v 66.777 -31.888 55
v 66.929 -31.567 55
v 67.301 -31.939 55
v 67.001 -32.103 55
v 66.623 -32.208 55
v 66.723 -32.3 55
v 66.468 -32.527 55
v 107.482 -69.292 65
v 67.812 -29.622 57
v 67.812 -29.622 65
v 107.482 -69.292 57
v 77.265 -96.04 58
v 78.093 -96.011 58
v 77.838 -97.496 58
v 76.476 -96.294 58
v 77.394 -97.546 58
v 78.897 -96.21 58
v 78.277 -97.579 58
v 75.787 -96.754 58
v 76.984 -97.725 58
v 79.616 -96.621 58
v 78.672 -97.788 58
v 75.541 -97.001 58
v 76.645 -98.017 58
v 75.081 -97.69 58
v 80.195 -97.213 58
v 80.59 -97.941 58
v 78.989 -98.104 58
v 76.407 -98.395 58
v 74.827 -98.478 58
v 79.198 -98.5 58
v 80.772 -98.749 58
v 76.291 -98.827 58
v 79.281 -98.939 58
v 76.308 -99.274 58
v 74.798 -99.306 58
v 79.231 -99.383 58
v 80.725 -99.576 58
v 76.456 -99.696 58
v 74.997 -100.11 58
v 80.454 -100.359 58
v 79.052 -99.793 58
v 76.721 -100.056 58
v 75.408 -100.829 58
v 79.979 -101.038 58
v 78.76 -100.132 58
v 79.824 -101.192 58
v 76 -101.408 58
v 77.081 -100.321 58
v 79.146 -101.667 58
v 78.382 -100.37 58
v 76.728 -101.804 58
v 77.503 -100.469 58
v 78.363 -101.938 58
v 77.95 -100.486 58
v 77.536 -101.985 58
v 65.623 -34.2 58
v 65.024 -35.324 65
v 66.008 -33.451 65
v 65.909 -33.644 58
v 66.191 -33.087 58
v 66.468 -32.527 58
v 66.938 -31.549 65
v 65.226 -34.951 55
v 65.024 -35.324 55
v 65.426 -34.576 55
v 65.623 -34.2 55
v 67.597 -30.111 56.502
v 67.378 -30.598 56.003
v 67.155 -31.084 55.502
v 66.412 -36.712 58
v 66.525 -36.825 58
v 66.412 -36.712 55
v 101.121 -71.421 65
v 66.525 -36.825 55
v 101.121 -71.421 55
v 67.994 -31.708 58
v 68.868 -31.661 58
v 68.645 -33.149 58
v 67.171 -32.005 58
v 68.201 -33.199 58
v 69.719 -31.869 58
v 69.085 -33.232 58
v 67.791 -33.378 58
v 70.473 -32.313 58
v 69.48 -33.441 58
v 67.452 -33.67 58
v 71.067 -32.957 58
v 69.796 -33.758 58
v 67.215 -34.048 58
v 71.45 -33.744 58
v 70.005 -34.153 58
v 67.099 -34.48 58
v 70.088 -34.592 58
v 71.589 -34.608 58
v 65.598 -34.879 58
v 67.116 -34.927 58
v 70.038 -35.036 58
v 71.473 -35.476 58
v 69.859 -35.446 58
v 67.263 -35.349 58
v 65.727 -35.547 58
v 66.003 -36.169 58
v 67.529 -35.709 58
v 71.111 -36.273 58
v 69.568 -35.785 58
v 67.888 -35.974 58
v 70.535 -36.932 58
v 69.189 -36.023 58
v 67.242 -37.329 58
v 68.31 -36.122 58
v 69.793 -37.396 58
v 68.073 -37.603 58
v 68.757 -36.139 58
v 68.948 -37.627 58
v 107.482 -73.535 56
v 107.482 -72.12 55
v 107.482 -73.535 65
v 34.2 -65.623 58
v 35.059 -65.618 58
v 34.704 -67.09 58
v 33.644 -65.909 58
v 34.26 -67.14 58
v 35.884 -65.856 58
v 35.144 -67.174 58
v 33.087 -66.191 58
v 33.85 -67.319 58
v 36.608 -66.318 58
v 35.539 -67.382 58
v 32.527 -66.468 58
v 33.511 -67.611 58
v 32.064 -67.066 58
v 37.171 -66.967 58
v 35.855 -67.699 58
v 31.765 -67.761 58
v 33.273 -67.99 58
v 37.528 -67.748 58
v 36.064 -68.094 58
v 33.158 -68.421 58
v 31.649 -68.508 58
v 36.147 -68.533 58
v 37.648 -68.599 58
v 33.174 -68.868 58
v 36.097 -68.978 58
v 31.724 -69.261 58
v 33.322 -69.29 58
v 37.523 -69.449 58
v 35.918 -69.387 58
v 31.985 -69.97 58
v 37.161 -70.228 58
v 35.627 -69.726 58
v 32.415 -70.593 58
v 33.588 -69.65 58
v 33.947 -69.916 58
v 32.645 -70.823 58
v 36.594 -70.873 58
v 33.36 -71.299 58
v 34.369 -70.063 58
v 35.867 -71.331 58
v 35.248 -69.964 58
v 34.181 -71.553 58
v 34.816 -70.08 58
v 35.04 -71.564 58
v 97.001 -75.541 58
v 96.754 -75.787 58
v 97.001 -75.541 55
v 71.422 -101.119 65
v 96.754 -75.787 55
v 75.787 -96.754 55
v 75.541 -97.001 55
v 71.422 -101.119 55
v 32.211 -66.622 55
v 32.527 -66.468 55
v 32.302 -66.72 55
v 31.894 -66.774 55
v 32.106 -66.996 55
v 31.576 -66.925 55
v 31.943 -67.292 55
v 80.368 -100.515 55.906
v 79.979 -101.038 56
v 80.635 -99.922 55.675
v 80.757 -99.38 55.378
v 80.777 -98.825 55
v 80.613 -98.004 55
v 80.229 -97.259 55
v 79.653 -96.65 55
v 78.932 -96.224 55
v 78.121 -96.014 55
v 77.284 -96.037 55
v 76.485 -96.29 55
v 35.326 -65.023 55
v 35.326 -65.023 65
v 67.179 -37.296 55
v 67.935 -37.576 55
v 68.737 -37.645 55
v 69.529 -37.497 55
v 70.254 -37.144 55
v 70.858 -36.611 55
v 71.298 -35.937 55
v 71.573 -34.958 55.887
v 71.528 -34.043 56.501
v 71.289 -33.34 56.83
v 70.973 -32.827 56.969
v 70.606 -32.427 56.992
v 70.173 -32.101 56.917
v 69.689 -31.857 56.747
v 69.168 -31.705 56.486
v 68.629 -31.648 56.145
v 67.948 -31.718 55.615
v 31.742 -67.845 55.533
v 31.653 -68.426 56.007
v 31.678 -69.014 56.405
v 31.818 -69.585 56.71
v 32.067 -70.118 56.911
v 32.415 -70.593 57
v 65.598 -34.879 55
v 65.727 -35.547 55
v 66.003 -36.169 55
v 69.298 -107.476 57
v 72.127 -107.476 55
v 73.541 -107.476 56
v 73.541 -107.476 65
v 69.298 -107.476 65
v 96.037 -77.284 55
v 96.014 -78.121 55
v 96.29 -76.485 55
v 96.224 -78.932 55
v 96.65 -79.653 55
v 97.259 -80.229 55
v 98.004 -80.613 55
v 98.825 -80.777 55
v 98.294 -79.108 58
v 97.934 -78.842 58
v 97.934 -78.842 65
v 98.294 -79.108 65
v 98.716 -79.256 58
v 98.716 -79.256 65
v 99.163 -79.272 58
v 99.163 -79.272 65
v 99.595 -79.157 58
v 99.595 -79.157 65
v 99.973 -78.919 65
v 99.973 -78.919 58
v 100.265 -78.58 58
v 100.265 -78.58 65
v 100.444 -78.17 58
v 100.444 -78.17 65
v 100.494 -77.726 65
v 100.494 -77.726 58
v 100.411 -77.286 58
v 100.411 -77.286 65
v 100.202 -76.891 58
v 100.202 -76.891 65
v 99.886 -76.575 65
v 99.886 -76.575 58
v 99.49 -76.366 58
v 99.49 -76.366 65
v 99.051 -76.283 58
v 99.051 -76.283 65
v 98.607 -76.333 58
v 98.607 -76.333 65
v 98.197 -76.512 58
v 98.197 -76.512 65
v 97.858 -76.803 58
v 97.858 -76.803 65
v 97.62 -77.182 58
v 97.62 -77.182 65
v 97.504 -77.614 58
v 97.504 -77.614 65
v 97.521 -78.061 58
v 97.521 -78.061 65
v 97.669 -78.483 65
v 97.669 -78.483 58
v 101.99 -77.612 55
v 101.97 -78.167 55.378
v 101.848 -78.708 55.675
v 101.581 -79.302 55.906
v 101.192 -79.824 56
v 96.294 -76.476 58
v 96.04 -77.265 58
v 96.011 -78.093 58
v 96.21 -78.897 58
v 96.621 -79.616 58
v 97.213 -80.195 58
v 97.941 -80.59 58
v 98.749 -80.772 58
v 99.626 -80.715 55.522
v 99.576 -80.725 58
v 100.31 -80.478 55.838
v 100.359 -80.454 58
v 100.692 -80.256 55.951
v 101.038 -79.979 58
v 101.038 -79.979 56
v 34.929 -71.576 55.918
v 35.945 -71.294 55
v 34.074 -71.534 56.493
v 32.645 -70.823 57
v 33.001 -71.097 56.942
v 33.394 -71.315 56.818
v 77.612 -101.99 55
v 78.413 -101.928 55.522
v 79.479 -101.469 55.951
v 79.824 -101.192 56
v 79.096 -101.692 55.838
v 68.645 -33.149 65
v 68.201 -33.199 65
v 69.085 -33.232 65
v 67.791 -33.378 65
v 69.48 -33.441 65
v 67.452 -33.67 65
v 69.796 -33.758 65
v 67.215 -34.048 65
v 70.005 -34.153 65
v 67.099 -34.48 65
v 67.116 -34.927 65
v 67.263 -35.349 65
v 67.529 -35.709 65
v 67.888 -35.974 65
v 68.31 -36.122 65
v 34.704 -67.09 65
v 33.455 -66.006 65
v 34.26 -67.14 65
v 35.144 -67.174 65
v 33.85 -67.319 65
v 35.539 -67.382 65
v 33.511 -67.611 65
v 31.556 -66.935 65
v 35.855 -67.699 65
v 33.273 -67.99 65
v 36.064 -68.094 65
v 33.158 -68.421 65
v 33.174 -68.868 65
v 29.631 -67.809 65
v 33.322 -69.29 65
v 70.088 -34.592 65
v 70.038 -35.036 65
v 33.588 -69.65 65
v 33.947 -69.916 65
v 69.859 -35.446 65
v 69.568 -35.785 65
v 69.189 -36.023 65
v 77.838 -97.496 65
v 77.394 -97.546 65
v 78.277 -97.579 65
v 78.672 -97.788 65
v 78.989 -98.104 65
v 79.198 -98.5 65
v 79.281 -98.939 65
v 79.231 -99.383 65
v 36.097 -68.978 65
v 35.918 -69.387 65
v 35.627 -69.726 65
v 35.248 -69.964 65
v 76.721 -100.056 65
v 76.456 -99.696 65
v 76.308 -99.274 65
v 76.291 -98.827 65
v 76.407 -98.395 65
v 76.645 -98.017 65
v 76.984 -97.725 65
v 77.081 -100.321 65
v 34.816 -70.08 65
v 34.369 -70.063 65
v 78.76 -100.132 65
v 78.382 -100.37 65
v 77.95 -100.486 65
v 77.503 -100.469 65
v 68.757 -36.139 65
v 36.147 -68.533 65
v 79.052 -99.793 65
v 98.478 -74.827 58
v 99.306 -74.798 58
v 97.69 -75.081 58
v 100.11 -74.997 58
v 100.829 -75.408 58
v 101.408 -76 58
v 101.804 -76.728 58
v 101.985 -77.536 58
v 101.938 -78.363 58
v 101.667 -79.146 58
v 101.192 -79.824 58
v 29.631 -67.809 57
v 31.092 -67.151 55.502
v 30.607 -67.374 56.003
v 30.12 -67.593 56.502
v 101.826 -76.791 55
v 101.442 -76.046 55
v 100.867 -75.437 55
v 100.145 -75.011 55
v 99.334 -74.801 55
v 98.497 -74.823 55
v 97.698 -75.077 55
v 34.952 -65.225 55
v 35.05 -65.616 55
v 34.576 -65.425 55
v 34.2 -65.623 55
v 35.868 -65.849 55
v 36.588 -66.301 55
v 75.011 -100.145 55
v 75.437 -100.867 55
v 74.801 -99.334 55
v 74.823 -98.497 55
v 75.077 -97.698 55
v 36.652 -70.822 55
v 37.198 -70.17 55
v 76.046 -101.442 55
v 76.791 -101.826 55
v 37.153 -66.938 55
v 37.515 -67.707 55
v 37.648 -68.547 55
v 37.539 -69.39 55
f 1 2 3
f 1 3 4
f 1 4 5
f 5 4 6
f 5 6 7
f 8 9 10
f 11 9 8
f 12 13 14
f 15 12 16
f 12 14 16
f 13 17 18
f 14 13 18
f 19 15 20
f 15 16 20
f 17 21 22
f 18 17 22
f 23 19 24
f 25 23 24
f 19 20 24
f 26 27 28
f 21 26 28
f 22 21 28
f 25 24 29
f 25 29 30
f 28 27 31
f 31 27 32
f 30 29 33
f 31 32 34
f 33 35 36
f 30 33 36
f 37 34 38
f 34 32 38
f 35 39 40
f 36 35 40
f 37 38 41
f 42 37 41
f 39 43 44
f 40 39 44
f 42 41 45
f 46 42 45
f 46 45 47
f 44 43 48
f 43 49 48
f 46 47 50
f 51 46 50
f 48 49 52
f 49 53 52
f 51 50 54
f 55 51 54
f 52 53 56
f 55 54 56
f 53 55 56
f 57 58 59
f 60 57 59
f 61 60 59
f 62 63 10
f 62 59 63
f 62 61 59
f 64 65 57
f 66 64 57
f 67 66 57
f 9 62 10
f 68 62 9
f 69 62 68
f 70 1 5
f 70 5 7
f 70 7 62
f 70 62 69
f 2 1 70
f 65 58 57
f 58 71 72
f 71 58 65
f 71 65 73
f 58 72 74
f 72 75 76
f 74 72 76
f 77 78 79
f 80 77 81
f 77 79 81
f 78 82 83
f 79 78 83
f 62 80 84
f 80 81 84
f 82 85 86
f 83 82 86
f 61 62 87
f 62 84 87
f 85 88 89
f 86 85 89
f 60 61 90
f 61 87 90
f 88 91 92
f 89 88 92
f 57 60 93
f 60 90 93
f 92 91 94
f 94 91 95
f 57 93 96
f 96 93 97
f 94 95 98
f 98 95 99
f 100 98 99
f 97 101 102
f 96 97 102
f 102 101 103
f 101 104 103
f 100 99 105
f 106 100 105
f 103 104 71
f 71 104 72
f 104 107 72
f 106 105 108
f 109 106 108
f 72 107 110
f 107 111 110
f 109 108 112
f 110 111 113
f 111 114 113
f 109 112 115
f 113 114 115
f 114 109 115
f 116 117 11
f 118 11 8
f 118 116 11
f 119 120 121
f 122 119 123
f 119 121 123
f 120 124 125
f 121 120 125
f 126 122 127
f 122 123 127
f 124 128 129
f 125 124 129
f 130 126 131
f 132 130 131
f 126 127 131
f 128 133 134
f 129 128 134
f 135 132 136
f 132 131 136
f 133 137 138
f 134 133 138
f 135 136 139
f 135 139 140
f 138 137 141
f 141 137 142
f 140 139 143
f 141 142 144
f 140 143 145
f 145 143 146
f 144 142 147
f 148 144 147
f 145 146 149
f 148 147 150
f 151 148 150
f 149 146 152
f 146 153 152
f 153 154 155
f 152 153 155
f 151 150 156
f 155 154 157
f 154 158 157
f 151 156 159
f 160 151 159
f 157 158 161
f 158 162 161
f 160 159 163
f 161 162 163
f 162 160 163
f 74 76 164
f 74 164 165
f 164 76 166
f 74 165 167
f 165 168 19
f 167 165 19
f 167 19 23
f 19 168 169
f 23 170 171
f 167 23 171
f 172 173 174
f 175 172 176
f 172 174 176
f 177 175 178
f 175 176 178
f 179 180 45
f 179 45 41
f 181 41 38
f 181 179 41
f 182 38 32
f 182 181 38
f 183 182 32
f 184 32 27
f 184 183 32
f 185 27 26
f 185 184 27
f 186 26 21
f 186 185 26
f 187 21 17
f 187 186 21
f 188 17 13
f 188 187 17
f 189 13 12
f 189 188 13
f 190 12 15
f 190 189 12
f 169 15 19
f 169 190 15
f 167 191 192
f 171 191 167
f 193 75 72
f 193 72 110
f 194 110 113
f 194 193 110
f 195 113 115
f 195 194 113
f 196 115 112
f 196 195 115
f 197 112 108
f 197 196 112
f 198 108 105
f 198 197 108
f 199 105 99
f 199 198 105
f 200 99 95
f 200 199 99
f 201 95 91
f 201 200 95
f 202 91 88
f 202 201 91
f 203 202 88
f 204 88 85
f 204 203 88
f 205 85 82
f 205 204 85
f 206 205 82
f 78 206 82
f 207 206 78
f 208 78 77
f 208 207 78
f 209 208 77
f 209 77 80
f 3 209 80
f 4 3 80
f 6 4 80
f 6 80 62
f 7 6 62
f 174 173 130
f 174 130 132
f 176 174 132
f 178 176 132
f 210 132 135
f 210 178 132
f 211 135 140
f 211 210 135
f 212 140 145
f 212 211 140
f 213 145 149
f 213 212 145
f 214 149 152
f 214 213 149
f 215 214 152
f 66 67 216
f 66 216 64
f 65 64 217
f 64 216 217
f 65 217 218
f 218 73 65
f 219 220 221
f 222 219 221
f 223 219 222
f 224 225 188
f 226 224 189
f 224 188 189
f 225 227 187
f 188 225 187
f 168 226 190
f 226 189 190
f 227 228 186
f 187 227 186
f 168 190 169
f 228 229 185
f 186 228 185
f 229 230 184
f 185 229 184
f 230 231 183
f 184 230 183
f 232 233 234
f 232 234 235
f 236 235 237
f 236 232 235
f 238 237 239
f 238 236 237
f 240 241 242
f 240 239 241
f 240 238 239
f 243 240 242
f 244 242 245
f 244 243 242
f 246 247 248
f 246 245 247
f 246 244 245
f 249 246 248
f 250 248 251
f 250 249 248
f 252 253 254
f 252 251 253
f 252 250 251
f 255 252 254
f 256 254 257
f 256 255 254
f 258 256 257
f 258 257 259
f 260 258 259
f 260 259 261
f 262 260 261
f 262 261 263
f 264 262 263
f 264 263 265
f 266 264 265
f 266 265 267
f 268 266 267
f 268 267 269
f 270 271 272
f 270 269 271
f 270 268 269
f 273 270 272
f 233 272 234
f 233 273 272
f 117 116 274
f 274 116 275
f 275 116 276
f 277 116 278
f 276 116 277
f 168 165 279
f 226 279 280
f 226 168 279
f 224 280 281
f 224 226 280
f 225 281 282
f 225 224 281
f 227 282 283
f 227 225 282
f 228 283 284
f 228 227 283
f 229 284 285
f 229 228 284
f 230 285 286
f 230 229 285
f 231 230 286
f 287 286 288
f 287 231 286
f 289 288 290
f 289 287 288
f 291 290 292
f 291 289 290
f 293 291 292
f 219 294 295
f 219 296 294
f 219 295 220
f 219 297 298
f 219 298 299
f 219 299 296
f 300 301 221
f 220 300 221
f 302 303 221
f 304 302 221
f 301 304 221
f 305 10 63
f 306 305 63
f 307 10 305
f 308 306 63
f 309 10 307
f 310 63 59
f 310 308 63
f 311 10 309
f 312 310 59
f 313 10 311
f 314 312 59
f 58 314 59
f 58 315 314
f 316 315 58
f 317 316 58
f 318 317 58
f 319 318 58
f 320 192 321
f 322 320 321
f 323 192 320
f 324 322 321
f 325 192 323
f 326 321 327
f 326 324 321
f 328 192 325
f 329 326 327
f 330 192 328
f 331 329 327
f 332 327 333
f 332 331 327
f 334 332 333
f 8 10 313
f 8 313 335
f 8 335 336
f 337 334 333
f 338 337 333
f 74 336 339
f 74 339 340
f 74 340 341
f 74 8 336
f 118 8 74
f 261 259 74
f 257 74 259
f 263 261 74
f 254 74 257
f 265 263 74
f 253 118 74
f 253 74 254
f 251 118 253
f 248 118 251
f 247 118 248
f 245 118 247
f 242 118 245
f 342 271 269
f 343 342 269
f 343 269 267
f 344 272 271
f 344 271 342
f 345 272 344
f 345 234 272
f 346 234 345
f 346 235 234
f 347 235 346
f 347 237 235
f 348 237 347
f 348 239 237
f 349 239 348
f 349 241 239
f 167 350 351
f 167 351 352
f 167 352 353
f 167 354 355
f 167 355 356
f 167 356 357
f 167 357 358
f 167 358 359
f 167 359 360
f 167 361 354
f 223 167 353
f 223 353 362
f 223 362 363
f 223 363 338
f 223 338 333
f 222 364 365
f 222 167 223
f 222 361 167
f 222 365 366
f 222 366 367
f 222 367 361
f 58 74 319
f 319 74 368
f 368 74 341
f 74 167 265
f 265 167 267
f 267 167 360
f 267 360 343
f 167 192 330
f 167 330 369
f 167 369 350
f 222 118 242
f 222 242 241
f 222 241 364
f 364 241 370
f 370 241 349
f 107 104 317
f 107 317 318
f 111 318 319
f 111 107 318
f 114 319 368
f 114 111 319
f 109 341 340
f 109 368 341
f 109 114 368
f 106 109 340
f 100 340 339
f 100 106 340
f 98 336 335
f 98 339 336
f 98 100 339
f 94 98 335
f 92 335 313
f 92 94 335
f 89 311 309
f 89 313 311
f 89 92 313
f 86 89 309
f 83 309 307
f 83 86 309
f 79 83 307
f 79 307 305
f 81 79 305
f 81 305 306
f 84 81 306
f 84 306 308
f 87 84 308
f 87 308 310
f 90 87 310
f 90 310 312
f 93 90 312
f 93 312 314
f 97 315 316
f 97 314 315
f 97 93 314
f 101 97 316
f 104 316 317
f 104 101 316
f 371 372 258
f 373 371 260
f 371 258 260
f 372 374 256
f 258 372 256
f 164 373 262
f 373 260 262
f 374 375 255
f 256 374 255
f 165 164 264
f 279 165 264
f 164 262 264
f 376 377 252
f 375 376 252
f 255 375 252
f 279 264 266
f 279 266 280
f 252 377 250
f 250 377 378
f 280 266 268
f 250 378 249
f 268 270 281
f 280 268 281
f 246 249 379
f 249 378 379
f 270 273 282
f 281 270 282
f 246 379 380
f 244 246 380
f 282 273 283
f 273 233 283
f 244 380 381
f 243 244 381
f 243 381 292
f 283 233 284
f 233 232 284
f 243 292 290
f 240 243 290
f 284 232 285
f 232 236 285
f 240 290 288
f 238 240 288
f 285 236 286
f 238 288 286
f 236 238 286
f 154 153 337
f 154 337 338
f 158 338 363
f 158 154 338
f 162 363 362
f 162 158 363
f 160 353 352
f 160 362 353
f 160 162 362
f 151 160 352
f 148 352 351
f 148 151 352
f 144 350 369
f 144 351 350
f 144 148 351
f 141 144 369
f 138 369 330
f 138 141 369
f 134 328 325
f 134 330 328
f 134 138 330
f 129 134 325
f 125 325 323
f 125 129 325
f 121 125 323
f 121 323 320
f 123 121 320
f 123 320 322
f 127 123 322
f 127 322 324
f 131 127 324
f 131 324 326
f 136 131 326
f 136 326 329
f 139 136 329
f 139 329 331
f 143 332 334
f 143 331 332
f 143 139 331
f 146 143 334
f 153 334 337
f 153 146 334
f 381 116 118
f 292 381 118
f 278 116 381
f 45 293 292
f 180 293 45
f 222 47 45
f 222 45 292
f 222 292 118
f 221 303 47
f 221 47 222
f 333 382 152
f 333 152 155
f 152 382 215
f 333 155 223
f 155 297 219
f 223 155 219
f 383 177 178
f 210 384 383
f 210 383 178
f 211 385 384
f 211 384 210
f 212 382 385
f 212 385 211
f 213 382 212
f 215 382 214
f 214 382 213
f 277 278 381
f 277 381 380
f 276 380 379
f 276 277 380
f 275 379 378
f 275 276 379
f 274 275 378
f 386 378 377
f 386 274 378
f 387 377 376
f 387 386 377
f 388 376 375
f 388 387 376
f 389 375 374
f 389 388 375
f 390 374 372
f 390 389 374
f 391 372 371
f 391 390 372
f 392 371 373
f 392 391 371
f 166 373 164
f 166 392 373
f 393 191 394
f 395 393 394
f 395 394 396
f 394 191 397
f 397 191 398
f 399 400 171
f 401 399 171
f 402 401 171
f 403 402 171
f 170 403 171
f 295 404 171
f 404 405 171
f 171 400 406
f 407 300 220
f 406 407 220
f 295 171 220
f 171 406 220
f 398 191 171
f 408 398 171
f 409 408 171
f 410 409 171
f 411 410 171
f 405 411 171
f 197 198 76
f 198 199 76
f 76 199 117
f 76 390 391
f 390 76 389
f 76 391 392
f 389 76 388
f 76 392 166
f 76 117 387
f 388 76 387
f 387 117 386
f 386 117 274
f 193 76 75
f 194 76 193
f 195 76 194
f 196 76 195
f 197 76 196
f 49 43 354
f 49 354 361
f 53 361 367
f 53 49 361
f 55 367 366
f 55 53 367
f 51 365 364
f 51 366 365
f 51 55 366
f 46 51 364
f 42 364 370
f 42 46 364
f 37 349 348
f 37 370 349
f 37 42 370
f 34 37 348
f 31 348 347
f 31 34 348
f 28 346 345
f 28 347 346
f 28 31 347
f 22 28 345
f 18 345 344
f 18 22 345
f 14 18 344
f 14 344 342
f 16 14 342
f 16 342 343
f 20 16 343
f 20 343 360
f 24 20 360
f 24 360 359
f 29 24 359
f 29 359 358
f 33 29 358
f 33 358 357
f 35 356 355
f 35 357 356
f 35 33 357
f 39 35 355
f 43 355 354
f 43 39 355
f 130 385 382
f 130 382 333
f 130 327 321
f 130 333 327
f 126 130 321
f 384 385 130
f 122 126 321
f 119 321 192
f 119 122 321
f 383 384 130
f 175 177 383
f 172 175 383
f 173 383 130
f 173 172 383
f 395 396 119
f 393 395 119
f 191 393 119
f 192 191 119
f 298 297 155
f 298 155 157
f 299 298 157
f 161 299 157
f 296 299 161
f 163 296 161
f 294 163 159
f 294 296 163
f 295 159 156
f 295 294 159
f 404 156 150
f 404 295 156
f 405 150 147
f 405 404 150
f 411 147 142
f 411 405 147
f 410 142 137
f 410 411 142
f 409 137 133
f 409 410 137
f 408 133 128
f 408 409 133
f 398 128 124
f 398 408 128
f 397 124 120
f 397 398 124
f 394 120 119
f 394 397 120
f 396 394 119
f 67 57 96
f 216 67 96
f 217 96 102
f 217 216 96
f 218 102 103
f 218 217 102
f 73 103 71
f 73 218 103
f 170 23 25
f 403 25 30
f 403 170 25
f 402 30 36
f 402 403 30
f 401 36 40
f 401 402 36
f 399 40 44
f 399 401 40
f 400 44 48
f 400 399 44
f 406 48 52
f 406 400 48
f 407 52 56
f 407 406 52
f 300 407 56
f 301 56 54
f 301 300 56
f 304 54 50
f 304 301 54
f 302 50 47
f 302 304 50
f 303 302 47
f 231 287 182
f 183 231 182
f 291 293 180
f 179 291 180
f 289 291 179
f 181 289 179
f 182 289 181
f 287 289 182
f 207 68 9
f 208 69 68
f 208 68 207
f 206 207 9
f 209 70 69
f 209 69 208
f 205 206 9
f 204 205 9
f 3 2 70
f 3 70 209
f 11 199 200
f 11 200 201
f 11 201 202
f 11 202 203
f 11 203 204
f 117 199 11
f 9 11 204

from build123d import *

# Parameters (mm, degrees)
CYLINDER1730_R              = 3
CYLINDER1730_DEPTH          = 3
CYLINDER1727_R              = 3
CYLINDER1727_DEPTH          = 3
CYLINDER1728_R              = 3
CYLINDER1728_DEPTH          = 3
CYLINDER1729_R              = 3
CYLINDER1729_DEPTH          = 3
COMPOUND871_PLACEMENT_ANGLE = 225
CYLINDER1734_R              = 1.5
CYLINDER1734_DEPTH          = 60
CYLINDER1731_R              = 1.5
CYLINDER1731_DEPTH          = 60
CYLINDER1732_R              = 1.5
CYLINDER1732_DEPTH          = 60
CYLINDER1733_R              = 1.5
CYLINDER1733_DEPTH          = 60
COMPOUND874_PLACEMENT_ANGLE = 225
CYLINDER1735_R              = 74
CYLINDER1735_DEPTH          = 40
BOX688_W                    = 42
BOX688_H                    = 62
BOX688_DEPTH                = 50
COMPOUND872_PLACEMENT_ANGLE = 225
BOX689_W                    = 54
BOX689_H                    = 68
BOX689_DEPTH                = 10
COMPOUND873_PLACEMENT_ANGLE = 225
CHAMFER054_SIZE             = 3
CHAMFER055_SIZE             = 2
CHAMFER056_SIZE             = 1


with BuildPart() as v_lec1730:
    # Cylinder1730 → Cylinder1730 (new body)
    with BuildSketch(Plane(origin=(-24, 73, -80), x_dir=(1, 0, 0), z_dir=(0, 0, 1))):
        Circle(CYLINDER1730_R)
    extrude(amount=CYLINDER1730_DEPTH)


with BuildPart() as v_lec1727:
    # Cylinder1727 → Cylinder1727 (new body)
    with BuildSketch(Plane(origin=(-15, 125, -80), x_dir=(1, 0, 0), z_dir=(0, 0, 1))):
        Circle(CYLINDER1727_R)
    extrude(amount=CYLINDER1727_DEPTH)


with BuildPart() as v_lec1728:
    # Cylinder1728 → Cylinder1728 (new body)
    with BuildSketch(Plane(origin=(15, 125, -80), x_dir=(1, 0, 0), z_dir=(0, 0, 1))):
        Circle(CYLINDER1728_R)
    extrude(amount=CYLINDER1728_DEPTH)


with BuildPart() as compound871:
    # Cylinder1729 → Cylinder1729 (new body)
    with BuildSketch(Plane(origin=(24, 73, -80), x_dir=(1, 0, 0), z_dir=(0, 0, 1))):
        Circle(CYLINDER1729_R)
    extrude(amount=CYLINDER1729_DEPTH)

    # Compound871: union Válec1730, Válec1727, Válec1728
    add(v_lec1730.part)
    add(v_lec1727.part)
    add(v_lec1728.part)


with BuildPart() as compound871_1:
    # Compound871 placement: moved
    add(compound871.part.moved(Location((0, 0, 135))).rotate(Axis((0, 0, 135), (0, 0, 1)), COMPOUND871_PLACEMENT_ANGLE))


with BuildPart() as v_lec1734:
    # Cylinder1734 → Cylinder1734 (new body)
    with BuildSketch(Plane(origin=(-24, 73, -80), x_dir=(1, 0, 0), z_dir=(0, 0, 1))):
        Circle(CYLINDER1734_R)
    extrude(amount=CYLINDER1734_DEPTH)


with BuildPart() as v_lec1731:
    # Cylinder1731 → Cylinder1731 (new body)
    with BuildSketch(Plane(origin=(-15, 125, -80), x_dir=(1, 0, 0), z_dir=(0, 0, 1))):
        Circle(CYLINDER1731_R)
    extrude(amount=CYLINDER1731_DEPTH)


with BuildPart() as v_lec1732:
    # Cylinder1732 → Cylinder1732 (new body)
    with BuildSketch(Plane(origin=(15, 125, -80), x_dir=(1, 0, 0), z_dir=(0, 0, 1))):
        Circle(CYLINDER1732_R)
    extrude(amount=CYLINDER1732_DEPTH)


with BuildPart() as compound874:
    # Cylinder1733 → Cylinder1733 (new body)
    with BuildSketch(Plane(origin=(24, 73, -80), x_dir=(1, 0, 0), z_dir=(0, 0, 1))):
        Circle(CYLINDER1733_R)
    extrude(amount=CYLINDER1733_DEPTH)

    # Compound874: union Válec1734, Válec1731, Válec1732
    add(v_lec1734.part)
    add(v_lec1731.part)
    add(v_lec1732.part)


with BuildPart() as compound874_1:
    # Compound874 placement: moved
    add(compound874.part.moved(Location((0, 0, 100))).rotate(Axis((0, 0, 100), (0, 0, 1)), COMPOUND874_PLACEMENT_ANGLE))


with BuildPart() as v_lec1735:
    # Cylinder1735 → Cylinder1735 (new body)
    with BuildSketch(Plane.XY.offset(44)):
        Circle(CYLINDER1735_R)
    extrude(amount=CYLINDER1735_DEPTH)


with BuildPart() as compound872:
    # Box688 → Box688 (new body)
    with BuildSketch(Plane(origin=(-21.001071, 60.005081, 31), x_dir=(1, 0, 0), z_dir=(0, 0, 1))):
        with Locations((21, 31)):
            Rectangle(BOX688_W, BOX688_H)
    extrude(amount=BOX688_DEPTH)


with BuildPart() as compound872_1:
    # Compound872 placement: moved
    add(compound872.part.rotate(Axis((0, 0, 0), (0, 0, 1)), COMPOUND872_PLACEMENT_ANGLE))


with BuildPart() as cut512:
    # Box689 → Box689 (new body)
    with BuildSketch(Plane(origin=(-27.004408, 59.99801, 75), x_dir=(1, 0, 0), z_dir=(0, 0, 1))):
        with Locations((27, 34)):
            Rectangle(BOX689_W, BOX689_H)
    extrude(amount=BOX689_DEPTH)


with BuildPart() as cut512_1:
    # Compound873 placement: moved
    add(cut512.part.moved(Location((0, 0, -20))).rotate(Axis((0, 0, -20), (0, 0, 1)), COMPOUND873_PLACEMENT_ANGLE))

    # Cut502: cut Compound872
    add(compound872_1.part, mode=Mode.SUBTRACT)

    # Cut510: cut Válec1735
    add(v_lec1735.part, mode=Mode.SUBTRACT)

    # Chamfer054
    chamfer054_edges = [cut512_1.edges().sort_by_distance(p)[0] for p in [
        (109.603261, -71.413261, 60),
        (71.419495, -109.597027, 60),
    ]]
    chamfer(chamfer054_edges, length=CHAMFER054_SIZE)

    # Chamfer055
    chamfer055_edges = [cut512_1.edges().sort_by_distance(p)[0] for p in [
        (87.647149, -49.457149, 55),
        (49.464605, -87.642137, 55),
    ]]
    chamfer(chamfer055_edges, length=CHAMFER055_SIZE)

    # Chamfer056
    chamfer056_edges = [cut512_1.edges().sort_by_distance(p)[0] for p in [
        (90.511378, -90.505144, 55),
    ]]
    chamfer(chamfer056_edges, length=CHAMFER056_SIZE)

    # Cut511: cut Compound874
    add(compound874_1.part, mode=Mode.SUBTRACT)

    # Cut512: cut Compound871
    add(compound871_1.part, mode=Mode.SUBTRACT)


solid = cut512_1.part
